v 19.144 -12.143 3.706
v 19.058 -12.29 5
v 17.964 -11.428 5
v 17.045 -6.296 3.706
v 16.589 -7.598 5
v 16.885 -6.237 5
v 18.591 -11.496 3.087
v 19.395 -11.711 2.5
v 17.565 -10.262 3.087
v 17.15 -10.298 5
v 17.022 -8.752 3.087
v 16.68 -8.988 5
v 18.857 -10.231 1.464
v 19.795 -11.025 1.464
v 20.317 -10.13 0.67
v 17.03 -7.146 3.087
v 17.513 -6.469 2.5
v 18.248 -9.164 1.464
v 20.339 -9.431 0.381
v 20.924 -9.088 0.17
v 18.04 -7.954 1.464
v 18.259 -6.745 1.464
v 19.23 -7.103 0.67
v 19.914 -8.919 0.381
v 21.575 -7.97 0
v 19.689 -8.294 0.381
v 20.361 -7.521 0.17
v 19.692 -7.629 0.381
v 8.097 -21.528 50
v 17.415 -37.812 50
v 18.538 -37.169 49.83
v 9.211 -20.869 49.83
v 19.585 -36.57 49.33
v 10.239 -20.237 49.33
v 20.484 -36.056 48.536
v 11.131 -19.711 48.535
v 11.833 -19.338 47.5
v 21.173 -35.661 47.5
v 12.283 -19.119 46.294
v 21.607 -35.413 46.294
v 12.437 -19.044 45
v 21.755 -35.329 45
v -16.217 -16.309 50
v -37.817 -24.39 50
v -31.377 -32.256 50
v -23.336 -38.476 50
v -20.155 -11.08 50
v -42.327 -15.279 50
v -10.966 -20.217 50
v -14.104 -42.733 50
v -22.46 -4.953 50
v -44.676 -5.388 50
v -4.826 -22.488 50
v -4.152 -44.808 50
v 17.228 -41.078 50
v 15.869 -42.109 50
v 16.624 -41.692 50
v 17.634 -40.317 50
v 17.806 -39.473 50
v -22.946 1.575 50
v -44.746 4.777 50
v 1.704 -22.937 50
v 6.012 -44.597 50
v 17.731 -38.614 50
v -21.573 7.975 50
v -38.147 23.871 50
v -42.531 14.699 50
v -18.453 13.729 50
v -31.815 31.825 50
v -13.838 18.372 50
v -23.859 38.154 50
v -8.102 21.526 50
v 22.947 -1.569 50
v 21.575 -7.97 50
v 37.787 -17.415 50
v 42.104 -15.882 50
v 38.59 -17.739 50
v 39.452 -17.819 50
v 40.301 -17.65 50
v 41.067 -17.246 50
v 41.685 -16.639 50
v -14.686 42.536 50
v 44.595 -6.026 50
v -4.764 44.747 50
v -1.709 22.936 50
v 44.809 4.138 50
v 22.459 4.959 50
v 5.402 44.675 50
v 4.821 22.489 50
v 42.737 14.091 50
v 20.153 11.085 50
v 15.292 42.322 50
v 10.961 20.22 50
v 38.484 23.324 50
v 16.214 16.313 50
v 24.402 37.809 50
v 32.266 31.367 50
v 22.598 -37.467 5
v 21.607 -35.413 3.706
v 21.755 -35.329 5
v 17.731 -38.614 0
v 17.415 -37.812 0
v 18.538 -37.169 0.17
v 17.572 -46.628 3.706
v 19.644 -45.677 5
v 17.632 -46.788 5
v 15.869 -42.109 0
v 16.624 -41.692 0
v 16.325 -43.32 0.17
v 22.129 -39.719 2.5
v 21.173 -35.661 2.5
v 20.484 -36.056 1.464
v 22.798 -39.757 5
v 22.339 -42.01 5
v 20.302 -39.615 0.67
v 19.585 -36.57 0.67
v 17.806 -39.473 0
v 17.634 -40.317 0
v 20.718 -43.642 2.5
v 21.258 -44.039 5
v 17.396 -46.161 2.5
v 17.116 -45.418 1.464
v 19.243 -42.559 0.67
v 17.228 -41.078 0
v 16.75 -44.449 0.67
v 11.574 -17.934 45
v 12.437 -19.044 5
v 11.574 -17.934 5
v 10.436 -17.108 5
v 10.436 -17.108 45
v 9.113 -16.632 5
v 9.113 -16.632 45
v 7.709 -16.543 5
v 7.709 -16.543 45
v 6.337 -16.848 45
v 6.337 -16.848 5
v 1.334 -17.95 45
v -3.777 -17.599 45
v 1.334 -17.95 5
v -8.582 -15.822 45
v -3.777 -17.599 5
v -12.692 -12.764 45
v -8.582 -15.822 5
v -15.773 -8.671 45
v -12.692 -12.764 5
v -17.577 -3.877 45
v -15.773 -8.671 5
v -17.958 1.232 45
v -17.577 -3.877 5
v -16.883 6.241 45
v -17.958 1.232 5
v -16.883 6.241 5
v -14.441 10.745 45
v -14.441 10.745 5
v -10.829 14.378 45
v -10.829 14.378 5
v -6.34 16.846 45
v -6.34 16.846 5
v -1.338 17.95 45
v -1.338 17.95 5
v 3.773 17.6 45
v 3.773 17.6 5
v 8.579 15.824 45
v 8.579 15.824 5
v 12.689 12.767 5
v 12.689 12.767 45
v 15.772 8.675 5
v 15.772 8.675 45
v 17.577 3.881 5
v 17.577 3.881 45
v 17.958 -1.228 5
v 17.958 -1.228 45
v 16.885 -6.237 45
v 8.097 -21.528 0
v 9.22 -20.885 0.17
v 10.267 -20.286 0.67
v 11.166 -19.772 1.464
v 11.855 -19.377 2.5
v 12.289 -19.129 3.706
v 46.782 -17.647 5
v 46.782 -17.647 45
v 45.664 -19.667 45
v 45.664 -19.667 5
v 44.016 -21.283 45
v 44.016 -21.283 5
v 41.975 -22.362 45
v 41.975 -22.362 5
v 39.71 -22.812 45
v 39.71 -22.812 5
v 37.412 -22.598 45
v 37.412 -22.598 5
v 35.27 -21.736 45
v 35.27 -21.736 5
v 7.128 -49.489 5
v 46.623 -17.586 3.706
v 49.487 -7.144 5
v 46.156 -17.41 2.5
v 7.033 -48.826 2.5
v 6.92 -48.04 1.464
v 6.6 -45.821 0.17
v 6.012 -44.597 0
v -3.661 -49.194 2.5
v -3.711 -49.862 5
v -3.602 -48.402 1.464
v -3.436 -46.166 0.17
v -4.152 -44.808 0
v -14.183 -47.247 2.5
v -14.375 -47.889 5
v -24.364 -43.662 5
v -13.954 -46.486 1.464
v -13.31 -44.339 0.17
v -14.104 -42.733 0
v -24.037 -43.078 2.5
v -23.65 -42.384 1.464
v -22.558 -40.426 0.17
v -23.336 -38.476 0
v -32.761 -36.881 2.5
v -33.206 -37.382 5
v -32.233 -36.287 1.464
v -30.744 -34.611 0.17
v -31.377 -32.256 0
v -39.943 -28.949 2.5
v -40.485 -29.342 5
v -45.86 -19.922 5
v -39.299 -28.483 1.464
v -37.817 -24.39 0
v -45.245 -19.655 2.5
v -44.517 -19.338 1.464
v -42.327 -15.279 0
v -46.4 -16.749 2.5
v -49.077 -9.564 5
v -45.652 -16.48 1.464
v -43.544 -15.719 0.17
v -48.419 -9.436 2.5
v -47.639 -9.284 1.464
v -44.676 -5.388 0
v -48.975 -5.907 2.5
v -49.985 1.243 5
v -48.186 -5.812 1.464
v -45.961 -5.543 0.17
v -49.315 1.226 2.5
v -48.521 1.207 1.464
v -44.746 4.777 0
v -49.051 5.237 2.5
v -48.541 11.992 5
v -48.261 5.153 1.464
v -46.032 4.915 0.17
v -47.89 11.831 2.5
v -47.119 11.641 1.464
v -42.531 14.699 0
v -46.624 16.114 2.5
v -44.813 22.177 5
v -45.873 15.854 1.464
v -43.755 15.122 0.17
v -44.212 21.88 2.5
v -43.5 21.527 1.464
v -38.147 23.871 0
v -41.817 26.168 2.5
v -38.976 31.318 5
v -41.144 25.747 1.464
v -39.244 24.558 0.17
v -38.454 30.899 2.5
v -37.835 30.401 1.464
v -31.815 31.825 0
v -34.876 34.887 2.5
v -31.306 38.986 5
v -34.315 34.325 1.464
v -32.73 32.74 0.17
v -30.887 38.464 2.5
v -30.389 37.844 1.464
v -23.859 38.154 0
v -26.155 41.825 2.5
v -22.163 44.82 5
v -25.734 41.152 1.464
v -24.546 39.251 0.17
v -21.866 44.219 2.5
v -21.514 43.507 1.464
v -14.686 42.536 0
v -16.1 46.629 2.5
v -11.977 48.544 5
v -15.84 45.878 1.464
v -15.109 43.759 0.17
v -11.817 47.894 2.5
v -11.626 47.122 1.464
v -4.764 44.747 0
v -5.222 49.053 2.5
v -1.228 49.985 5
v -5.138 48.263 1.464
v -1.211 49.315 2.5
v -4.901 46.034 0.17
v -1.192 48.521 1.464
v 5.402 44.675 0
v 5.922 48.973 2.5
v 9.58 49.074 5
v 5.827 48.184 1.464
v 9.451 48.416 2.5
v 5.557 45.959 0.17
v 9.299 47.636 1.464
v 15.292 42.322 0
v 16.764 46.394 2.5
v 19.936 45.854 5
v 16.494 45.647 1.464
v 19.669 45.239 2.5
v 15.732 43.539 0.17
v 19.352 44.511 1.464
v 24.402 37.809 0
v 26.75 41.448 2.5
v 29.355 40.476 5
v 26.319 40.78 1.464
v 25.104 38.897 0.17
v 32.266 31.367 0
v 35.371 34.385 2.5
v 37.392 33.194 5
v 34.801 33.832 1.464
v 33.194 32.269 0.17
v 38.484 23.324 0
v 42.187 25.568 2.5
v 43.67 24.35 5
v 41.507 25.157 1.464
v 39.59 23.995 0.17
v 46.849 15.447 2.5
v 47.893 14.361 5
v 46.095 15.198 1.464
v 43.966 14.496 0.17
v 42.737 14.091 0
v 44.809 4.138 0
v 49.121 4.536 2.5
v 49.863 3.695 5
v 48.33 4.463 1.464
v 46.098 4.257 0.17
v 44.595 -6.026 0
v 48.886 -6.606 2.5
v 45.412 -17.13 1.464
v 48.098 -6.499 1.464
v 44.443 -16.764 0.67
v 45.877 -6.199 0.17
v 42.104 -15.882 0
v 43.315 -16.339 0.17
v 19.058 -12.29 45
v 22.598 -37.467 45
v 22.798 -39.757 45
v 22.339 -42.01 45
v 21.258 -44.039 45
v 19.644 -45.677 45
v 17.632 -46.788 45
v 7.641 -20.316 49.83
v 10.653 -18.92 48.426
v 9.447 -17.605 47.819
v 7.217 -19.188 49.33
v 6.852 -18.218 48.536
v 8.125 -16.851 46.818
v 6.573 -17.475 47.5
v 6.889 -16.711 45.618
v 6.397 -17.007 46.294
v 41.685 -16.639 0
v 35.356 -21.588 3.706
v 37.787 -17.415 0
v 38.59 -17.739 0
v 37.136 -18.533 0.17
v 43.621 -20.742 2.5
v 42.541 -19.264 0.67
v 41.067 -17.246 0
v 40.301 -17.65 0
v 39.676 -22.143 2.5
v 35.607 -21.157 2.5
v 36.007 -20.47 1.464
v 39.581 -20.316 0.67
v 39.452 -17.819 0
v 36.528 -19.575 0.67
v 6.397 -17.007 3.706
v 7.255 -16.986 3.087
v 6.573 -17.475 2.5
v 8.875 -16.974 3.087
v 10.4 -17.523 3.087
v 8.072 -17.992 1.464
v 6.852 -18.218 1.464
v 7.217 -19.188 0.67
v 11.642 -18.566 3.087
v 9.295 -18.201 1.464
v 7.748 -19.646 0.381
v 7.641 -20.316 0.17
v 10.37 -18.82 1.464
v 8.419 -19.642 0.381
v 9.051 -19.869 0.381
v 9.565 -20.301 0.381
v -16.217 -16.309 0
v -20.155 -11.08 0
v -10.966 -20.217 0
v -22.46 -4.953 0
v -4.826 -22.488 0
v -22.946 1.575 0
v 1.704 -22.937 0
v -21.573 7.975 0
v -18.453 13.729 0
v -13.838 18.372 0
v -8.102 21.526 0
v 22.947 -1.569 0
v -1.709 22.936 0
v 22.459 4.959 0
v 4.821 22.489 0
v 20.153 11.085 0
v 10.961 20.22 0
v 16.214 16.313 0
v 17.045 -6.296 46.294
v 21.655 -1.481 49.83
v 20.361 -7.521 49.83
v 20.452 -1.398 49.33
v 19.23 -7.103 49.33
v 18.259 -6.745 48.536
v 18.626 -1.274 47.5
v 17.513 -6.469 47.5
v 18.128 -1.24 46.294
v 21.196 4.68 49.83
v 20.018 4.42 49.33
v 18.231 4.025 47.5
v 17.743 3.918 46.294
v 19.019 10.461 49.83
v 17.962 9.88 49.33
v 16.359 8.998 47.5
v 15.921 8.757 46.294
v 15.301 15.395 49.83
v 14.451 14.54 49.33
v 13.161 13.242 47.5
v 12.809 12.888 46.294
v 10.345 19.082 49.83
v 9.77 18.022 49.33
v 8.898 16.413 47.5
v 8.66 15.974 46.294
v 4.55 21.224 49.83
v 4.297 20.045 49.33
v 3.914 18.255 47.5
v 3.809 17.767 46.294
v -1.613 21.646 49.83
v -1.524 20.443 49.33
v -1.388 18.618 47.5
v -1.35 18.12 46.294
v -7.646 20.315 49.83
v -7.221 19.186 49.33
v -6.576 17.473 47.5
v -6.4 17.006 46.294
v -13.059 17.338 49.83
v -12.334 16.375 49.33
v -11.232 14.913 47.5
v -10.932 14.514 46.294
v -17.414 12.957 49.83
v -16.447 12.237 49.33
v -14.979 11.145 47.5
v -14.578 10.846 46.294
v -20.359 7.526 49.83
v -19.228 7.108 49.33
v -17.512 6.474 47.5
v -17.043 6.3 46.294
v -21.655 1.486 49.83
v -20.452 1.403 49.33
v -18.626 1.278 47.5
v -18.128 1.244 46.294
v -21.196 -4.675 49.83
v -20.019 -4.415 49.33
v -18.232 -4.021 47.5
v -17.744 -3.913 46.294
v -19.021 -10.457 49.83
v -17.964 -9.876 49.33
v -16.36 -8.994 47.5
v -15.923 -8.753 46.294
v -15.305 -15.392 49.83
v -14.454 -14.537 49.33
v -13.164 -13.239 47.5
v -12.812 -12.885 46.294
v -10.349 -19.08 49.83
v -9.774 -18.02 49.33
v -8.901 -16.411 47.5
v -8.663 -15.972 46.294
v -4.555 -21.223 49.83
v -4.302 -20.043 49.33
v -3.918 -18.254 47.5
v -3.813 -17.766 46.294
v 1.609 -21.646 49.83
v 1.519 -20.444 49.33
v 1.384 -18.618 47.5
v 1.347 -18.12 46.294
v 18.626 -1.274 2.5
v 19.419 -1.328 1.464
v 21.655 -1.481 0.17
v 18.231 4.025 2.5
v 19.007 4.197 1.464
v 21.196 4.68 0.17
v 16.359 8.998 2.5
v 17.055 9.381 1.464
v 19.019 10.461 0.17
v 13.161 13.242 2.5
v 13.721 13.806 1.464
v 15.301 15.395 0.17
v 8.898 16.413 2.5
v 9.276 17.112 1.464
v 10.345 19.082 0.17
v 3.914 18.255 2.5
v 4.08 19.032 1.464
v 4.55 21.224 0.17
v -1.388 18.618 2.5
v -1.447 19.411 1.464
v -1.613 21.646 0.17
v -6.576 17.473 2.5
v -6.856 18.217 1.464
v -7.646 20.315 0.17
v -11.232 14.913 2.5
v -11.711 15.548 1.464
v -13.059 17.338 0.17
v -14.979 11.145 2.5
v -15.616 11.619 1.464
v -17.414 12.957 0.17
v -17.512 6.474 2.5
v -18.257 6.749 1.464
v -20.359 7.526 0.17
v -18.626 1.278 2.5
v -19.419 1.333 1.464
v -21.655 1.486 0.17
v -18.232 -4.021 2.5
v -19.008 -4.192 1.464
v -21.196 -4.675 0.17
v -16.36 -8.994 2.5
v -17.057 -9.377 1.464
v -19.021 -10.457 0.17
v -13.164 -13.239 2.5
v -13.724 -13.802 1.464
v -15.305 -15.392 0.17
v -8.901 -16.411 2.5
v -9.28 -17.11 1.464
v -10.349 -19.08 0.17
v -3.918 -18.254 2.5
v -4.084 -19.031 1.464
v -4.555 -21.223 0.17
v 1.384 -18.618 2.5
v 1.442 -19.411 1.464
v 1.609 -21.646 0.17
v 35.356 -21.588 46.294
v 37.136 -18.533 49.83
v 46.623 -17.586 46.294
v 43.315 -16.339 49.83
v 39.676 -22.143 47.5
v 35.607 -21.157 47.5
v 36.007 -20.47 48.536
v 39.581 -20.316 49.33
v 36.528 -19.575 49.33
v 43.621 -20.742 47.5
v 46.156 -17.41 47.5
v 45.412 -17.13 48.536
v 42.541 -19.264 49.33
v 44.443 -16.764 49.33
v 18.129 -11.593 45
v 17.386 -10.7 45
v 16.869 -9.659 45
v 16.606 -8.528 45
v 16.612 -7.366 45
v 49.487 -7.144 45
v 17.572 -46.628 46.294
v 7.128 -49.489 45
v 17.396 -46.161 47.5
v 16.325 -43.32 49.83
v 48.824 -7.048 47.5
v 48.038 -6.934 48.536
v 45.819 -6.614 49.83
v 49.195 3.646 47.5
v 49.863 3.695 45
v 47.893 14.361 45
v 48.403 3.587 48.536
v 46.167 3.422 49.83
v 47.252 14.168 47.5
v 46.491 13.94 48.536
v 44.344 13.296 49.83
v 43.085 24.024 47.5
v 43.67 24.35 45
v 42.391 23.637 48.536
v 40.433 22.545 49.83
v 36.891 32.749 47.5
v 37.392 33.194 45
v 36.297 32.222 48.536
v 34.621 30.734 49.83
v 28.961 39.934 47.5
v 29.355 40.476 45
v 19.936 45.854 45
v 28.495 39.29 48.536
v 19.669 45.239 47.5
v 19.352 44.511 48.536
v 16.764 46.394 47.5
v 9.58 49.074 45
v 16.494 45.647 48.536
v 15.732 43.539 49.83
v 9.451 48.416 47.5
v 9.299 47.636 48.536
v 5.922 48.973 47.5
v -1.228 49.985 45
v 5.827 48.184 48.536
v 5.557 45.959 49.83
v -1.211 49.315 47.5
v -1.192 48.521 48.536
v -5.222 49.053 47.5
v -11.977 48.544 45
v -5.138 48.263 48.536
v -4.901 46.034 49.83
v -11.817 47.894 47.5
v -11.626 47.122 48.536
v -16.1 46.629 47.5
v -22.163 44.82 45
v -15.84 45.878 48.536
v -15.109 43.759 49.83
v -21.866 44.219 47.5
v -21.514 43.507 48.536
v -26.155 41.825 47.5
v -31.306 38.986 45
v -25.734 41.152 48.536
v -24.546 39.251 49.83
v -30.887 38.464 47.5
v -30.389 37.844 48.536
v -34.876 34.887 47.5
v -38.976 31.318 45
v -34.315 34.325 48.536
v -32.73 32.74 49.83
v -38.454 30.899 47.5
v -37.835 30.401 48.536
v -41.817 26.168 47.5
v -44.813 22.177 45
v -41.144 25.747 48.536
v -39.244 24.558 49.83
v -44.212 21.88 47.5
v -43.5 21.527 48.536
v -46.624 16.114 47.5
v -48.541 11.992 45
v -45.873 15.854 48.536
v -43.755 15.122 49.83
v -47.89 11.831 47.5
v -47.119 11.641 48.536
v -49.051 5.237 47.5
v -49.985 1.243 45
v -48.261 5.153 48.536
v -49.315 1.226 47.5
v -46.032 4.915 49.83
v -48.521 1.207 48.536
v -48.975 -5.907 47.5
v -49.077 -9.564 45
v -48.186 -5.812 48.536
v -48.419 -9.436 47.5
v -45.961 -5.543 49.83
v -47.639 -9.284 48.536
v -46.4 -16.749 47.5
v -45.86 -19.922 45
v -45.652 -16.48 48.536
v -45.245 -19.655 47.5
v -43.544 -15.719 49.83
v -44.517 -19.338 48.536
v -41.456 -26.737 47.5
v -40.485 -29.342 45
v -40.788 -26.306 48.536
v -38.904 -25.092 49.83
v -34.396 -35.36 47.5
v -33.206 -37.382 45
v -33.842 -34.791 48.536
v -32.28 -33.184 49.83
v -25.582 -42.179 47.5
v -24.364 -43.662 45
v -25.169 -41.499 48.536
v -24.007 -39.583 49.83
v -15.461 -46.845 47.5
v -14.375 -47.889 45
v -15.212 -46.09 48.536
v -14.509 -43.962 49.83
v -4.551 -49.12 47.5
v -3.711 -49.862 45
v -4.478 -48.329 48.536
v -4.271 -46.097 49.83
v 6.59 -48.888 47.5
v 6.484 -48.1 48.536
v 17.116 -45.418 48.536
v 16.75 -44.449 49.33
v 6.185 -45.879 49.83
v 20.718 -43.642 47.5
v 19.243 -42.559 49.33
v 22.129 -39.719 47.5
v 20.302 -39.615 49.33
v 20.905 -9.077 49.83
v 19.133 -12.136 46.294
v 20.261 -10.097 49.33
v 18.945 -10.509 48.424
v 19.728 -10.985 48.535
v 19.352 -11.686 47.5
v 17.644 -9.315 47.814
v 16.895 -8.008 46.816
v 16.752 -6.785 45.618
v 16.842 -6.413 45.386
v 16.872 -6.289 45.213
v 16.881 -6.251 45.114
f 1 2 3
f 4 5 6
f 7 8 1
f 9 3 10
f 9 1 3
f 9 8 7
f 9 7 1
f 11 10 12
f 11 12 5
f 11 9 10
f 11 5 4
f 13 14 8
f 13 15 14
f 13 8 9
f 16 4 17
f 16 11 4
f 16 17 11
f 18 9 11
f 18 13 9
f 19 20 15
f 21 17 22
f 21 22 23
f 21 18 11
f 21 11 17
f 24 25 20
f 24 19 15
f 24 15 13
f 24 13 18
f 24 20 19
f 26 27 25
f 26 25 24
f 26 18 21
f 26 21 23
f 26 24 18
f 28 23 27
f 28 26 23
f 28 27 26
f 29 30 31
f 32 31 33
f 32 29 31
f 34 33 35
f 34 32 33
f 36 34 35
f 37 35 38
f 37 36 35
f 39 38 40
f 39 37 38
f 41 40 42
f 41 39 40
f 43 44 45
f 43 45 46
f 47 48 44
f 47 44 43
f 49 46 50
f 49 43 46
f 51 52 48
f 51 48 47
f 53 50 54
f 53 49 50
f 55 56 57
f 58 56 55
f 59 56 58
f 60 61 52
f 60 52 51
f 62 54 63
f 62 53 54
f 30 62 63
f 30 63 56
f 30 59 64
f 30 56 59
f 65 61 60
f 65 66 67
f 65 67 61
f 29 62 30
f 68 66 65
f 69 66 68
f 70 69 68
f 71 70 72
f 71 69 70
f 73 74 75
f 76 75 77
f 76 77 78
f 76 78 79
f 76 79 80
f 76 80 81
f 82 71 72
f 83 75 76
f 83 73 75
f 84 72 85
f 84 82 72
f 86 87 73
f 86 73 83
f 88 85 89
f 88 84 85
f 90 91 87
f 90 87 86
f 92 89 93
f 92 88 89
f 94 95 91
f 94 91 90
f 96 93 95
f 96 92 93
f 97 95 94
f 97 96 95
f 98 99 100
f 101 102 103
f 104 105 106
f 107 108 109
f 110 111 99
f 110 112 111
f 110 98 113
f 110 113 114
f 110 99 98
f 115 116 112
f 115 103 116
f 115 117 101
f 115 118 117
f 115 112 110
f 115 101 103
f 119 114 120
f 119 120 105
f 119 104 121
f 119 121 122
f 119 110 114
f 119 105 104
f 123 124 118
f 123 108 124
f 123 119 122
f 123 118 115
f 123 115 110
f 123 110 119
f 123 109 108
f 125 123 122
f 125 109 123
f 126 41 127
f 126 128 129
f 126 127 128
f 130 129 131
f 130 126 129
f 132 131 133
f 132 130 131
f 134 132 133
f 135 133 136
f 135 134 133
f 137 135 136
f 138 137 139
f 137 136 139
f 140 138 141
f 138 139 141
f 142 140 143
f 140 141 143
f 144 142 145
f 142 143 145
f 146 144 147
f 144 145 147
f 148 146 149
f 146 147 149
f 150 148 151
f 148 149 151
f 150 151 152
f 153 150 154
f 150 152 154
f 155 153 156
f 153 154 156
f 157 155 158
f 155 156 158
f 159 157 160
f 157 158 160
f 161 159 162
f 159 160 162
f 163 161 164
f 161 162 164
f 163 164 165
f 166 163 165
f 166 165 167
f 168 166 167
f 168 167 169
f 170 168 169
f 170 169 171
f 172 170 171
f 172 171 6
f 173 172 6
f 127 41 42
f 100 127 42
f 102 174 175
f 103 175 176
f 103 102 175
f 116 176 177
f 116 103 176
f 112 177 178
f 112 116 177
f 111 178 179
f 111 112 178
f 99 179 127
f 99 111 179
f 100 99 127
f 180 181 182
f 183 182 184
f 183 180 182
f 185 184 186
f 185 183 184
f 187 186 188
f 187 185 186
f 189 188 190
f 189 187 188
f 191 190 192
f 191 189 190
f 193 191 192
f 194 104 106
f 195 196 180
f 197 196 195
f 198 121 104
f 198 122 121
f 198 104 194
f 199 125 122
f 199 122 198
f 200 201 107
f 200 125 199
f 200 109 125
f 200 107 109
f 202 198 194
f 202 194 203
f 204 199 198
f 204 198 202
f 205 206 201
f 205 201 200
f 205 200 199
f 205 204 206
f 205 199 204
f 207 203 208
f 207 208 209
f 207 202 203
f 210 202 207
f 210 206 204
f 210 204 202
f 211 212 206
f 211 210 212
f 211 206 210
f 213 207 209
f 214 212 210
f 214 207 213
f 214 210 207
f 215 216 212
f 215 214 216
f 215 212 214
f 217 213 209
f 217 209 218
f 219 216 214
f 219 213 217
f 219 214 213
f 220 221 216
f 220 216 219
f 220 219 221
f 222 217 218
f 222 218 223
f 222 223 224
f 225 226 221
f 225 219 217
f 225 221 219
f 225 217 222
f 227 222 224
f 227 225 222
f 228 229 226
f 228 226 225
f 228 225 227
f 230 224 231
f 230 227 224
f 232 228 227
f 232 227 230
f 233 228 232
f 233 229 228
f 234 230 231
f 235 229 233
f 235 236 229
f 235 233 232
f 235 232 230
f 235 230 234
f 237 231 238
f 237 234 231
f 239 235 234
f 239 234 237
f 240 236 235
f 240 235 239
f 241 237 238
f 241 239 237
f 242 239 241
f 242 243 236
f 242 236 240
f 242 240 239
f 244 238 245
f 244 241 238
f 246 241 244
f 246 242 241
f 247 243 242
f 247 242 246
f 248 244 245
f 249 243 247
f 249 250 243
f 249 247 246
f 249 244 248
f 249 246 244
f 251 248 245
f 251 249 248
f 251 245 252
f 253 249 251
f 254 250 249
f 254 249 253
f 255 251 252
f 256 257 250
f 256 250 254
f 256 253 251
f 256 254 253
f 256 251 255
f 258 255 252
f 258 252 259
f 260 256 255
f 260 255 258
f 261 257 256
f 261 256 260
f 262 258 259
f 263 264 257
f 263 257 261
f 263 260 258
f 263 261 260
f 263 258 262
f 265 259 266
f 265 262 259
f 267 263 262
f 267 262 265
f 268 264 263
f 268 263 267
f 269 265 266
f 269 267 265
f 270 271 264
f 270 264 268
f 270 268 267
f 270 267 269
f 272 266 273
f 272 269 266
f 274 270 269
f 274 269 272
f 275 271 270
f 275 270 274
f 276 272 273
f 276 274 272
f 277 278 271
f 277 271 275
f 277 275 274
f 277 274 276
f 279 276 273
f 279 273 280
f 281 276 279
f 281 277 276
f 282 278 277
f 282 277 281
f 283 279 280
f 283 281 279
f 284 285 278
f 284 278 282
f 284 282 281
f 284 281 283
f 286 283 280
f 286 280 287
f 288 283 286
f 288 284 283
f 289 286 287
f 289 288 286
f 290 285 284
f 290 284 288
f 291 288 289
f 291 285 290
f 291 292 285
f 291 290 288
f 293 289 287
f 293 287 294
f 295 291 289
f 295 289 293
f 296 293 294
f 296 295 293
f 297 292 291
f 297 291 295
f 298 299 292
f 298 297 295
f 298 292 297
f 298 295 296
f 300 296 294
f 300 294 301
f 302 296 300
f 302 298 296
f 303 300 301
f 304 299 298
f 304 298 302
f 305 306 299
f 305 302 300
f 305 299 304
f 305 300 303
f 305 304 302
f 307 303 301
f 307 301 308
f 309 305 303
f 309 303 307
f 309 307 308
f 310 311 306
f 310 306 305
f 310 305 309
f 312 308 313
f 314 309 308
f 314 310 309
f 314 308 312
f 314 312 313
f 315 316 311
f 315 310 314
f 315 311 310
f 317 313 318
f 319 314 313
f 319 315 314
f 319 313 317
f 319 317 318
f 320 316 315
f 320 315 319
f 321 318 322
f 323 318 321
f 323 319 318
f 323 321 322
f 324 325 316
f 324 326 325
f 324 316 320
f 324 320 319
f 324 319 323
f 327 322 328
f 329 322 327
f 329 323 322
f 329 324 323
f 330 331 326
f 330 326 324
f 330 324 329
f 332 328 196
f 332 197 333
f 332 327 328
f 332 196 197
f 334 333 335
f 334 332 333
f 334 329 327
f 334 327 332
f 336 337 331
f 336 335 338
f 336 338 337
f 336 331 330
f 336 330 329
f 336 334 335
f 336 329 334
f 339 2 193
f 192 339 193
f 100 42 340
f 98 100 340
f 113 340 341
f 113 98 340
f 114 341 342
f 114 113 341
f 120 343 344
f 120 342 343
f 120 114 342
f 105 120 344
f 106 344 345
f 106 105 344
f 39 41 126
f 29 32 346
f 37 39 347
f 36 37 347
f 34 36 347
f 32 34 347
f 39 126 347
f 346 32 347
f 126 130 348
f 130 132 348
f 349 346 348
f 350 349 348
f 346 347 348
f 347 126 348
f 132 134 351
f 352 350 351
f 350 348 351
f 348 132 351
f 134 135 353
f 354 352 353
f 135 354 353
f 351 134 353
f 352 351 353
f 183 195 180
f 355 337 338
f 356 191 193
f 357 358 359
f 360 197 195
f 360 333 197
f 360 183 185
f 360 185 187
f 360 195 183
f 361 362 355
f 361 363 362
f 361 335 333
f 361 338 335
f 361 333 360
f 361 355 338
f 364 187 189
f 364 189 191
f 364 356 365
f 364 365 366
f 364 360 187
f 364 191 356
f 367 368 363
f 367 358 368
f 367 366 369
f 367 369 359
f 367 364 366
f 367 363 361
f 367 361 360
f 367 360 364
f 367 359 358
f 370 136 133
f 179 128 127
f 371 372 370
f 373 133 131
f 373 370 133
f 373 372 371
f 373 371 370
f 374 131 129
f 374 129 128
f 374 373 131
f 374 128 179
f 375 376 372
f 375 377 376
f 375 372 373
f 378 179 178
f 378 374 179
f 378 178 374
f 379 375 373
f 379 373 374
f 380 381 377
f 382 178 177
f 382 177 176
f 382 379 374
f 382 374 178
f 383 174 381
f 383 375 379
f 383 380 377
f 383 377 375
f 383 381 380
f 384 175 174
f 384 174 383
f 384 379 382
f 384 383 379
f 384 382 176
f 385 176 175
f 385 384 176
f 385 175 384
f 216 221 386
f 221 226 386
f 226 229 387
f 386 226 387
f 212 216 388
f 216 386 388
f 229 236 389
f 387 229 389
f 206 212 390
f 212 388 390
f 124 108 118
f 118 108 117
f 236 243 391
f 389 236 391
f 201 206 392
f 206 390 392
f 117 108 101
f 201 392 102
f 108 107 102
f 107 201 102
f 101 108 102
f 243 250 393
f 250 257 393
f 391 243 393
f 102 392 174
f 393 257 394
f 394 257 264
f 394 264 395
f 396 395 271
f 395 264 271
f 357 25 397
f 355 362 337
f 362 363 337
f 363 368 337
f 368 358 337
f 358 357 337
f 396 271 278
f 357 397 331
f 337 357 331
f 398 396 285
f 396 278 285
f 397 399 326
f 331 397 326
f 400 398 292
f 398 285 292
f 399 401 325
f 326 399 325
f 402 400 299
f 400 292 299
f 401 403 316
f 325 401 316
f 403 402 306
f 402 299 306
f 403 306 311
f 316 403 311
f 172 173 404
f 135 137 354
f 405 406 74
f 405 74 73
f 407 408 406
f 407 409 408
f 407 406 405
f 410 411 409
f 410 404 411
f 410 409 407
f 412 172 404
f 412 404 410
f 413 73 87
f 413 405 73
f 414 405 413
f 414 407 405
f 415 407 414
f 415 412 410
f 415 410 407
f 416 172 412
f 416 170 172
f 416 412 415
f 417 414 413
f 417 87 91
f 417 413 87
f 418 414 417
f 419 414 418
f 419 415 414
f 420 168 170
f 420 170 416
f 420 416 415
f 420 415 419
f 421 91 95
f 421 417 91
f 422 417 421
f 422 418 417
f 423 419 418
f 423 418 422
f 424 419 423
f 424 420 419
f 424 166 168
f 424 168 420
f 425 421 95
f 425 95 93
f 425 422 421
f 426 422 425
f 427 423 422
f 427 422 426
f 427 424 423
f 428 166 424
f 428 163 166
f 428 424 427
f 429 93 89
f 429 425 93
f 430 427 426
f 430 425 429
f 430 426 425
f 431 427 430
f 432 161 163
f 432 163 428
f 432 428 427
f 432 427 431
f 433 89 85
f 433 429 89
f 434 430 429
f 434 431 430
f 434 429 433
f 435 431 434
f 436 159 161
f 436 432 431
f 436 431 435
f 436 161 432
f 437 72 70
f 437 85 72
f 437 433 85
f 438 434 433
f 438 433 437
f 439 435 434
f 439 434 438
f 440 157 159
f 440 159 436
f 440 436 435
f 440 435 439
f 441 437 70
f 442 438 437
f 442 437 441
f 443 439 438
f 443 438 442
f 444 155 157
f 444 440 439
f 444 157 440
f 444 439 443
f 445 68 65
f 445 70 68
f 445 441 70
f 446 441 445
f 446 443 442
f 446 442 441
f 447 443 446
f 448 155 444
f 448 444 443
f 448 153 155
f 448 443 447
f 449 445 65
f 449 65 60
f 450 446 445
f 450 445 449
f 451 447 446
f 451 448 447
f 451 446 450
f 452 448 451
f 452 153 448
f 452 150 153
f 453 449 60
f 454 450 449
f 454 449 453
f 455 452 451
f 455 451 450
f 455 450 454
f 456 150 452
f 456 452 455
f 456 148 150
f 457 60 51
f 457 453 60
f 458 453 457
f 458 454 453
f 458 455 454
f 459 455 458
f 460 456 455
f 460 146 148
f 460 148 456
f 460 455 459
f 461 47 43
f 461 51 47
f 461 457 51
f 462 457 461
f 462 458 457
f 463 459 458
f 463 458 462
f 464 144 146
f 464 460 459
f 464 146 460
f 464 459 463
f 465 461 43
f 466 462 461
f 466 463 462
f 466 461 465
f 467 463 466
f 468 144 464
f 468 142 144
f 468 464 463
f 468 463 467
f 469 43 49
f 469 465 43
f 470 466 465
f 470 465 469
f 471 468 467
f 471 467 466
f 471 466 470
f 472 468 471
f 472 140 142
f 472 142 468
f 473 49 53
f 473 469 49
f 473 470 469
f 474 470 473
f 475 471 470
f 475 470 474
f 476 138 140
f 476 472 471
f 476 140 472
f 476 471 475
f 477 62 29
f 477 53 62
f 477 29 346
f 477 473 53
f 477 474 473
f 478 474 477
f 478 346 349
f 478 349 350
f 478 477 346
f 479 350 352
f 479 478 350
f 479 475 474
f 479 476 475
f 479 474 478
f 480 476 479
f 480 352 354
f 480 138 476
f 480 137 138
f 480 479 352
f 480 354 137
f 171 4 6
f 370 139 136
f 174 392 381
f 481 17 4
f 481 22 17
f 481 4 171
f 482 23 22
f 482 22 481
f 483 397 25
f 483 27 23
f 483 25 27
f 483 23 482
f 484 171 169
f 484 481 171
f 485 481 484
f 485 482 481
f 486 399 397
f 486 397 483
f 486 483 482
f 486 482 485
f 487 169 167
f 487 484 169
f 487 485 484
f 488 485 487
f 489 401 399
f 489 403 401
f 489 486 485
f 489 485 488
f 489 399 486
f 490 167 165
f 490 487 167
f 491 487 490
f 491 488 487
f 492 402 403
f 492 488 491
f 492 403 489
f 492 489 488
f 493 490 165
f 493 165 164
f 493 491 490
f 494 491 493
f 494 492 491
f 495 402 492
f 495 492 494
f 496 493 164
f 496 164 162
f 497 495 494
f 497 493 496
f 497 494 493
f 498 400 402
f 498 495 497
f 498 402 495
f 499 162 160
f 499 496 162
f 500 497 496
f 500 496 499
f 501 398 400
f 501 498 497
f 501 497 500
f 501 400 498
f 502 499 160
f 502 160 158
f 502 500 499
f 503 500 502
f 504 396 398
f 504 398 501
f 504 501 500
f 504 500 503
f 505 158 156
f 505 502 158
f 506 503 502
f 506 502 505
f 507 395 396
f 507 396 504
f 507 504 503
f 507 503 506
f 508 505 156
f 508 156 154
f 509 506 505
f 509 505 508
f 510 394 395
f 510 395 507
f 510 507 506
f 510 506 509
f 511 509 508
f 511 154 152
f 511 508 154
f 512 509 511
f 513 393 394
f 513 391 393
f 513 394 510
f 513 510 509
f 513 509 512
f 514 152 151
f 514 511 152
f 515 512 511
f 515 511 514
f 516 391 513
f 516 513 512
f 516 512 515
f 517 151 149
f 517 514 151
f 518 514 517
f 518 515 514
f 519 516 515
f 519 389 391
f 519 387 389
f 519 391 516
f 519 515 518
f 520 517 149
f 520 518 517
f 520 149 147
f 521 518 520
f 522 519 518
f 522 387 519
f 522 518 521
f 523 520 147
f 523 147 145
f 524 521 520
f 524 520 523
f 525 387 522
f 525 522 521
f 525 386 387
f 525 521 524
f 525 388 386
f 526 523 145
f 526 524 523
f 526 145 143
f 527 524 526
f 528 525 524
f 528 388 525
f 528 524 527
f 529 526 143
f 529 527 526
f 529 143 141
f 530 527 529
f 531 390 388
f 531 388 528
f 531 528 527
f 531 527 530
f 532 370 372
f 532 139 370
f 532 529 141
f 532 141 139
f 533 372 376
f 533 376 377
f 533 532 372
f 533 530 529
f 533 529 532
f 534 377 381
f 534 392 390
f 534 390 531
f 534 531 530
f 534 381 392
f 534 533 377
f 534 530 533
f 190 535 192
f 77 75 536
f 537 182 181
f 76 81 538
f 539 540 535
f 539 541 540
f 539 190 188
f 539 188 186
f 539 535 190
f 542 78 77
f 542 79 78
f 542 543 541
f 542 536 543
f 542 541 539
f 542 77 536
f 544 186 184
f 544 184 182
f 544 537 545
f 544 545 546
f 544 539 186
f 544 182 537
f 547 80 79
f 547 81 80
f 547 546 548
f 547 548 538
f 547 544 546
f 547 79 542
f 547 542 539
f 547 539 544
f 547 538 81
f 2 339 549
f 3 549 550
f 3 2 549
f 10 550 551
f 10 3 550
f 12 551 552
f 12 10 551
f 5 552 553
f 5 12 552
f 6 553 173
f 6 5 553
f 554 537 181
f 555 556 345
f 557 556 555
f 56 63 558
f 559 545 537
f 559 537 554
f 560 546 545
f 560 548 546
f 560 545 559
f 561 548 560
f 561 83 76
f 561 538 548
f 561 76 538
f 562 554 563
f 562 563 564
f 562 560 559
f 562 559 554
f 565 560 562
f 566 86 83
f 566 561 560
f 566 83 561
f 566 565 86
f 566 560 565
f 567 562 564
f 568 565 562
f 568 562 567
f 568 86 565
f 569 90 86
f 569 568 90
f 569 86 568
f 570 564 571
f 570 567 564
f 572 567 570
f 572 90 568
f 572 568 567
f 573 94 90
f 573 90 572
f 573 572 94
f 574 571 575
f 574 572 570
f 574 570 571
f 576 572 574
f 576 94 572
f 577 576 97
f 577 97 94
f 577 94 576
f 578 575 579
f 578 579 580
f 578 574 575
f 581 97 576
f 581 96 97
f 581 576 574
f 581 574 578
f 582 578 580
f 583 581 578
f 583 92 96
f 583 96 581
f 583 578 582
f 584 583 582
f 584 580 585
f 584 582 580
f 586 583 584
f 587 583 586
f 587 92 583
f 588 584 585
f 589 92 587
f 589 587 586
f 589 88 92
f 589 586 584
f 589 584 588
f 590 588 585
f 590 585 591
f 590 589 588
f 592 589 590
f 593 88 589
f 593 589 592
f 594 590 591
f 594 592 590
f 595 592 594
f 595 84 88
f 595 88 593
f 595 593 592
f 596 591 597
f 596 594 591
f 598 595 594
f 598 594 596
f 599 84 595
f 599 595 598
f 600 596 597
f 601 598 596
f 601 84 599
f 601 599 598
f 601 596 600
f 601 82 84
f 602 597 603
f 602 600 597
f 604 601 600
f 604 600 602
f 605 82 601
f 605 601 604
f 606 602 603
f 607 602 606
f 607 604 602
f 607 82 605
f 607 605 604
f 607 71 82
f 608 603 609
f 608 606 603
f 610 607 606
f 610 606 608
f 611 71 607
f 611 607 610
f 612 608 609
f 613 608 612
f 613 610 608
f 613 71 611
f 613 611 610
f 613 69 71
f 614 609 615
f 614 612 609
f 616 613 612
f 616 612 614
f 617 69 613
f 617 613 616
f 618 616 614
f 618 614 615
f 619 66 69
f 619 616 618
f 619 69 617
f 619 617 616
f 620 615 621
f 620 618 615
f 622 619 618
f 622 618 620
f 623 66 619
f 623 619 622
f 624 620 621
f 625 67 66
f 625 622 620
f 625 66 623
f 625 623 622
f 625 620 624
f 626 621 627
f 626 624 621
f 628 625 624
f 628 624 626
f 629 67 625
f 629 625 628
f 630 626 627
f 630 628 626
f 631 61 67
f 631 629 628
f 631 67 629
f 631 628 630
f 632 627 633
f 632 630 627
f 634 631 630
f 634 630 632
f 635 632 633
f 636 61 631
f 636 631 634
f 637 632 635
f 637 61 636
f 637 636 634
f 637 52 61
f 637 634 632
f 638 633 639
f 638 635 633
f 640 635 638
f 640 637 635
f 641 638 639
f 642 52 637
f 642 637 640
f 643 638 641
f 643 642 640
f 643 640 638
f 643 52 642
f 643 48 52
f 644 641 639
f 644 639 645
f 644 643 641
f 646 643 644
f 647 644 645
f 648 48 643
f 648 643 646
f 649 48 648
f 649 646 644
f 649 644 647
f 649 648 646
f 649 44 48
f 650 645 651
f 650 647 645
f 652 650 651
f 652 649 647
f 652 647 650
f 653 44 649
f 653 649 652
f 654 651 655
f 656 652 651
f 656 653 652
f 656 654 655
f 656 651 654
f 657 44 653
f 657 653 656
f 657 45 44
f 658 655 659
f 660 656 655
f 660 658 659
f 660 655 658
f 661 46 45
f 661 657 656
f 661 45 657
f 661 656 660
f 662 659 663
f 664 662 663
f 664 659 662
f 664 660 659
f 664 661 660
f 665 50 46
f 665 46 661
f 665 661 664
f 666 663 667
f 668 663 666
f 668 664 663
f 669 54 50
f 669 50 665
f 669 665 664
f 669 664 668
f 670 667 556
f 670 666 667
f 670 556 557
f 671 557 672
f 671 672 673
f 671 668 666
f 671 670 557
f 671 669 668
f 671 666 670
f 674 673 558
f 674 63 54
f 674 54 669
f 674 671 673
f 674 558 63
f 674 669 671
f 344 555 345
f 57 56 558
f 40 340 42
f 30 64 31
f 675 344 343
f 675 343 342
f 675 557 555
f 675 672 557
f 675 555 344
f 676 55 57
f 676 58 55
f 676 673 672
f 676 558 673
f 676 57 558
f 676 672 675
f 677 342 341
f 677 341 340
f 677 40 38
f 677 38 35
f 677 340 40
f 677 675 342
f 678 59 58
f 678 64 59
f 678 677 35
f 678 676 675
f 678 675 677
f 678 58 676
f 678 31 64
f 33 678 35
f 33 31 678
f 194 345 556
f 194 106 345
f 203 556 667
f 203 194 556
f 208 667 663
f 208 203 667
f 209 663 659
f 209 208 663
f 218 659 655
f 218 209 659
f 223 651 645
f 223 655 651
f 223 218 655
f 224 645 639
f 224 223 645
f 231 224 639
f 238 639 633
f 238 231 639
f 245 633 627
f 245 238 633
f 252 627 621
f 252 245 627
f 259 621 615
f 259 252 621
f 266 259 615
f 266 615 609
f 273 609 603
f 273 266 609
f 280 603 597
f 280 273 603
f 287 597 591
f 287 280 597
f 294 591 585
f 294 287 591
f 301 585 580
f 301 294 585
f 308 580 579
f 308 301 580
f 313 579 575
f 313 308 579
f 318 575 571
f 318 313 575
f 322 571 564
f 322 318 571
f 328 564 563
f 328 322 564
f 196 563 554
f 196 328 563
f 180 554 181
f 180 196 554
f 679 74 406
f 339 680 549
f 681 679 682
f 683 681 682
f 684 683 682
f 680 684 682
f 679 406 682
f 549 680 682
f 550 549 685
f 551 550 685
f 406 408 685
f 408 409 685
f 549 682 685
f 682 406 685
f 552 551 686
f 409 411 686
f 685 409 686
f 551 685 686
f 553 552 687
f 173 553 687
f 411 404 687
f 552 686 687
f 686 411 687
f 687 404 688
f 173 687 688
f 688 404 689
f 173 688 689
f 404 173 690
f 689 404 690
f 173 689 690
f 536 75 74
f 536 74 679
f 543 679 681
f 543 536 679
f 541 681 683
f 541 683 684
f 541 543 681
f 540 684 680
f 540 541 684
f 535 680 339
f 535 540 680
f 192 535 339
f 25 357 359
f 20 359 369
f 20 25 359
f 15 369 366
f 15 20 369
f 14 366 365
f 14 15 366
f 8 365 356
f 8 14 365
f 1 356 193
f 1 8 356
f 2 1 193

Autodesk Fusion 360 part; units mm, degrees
sketch "草图1" plane through (0, 0, 0) normal (0, 0, 1) x (1, 0, 0)
  line L0 (10.0747, -14.9164) -> (21.7546, -35.3287)
  line L1 (15.0116, -9.9324) -> (35.2699, -21.7355)
  arc A0 (46.7824, -17.6466) -> (17.6321, -46.7879) centre (0, 0) ccw
  arc A1 (15.0116, -9.9324) -> (10.0747, -14.9164) centre (0, 0) ccw
  arc A2 (17.6321, -46.7879) -> (21.7546, -35.3287) centre (14.8109, -39.3019) ccw
  arc A3 (35.2699, -21.7355) -> (46.7824, -17.6466) centre (39.2972, -14.8232) ccw
  dimension "d1" = 100
  dimension "d2" = 36
  dimension "d3" = 8
extrude "拉伸1" add sketch "草图1" along normal blind 50
fillet "圆角1" radius 5 5 edges at (25.1407, -15.8339, 50) (41.9747, -22.3618, 50) (-35.3498, 35.3608, 50) (22.3386, -42.01, 50) (15.9146, -25.1226, 50)
fillet "圆角2" radius 5 5 edges at (10.0747, -14.9164, 22.5) (8.8197, -15.6912, 48.5451) (-12.7906, 12.6649, 50) (15.7752, -8.6685, 48.5475) (15.0116, -9.9324, 22.5)
fillet "圆角3" radius 5 8 edges at (17.0957, -27.1866, 0) (9.791, -16.8234, 0) (-12.7654, 12.6903, 0) (16.8692, -9.6593, 0) (27.1639, -17.0127, 0) (41.9747, -22.3618, 0) (-35.3498, 35.3608, 0) (22.3386, -42.01, 0)
